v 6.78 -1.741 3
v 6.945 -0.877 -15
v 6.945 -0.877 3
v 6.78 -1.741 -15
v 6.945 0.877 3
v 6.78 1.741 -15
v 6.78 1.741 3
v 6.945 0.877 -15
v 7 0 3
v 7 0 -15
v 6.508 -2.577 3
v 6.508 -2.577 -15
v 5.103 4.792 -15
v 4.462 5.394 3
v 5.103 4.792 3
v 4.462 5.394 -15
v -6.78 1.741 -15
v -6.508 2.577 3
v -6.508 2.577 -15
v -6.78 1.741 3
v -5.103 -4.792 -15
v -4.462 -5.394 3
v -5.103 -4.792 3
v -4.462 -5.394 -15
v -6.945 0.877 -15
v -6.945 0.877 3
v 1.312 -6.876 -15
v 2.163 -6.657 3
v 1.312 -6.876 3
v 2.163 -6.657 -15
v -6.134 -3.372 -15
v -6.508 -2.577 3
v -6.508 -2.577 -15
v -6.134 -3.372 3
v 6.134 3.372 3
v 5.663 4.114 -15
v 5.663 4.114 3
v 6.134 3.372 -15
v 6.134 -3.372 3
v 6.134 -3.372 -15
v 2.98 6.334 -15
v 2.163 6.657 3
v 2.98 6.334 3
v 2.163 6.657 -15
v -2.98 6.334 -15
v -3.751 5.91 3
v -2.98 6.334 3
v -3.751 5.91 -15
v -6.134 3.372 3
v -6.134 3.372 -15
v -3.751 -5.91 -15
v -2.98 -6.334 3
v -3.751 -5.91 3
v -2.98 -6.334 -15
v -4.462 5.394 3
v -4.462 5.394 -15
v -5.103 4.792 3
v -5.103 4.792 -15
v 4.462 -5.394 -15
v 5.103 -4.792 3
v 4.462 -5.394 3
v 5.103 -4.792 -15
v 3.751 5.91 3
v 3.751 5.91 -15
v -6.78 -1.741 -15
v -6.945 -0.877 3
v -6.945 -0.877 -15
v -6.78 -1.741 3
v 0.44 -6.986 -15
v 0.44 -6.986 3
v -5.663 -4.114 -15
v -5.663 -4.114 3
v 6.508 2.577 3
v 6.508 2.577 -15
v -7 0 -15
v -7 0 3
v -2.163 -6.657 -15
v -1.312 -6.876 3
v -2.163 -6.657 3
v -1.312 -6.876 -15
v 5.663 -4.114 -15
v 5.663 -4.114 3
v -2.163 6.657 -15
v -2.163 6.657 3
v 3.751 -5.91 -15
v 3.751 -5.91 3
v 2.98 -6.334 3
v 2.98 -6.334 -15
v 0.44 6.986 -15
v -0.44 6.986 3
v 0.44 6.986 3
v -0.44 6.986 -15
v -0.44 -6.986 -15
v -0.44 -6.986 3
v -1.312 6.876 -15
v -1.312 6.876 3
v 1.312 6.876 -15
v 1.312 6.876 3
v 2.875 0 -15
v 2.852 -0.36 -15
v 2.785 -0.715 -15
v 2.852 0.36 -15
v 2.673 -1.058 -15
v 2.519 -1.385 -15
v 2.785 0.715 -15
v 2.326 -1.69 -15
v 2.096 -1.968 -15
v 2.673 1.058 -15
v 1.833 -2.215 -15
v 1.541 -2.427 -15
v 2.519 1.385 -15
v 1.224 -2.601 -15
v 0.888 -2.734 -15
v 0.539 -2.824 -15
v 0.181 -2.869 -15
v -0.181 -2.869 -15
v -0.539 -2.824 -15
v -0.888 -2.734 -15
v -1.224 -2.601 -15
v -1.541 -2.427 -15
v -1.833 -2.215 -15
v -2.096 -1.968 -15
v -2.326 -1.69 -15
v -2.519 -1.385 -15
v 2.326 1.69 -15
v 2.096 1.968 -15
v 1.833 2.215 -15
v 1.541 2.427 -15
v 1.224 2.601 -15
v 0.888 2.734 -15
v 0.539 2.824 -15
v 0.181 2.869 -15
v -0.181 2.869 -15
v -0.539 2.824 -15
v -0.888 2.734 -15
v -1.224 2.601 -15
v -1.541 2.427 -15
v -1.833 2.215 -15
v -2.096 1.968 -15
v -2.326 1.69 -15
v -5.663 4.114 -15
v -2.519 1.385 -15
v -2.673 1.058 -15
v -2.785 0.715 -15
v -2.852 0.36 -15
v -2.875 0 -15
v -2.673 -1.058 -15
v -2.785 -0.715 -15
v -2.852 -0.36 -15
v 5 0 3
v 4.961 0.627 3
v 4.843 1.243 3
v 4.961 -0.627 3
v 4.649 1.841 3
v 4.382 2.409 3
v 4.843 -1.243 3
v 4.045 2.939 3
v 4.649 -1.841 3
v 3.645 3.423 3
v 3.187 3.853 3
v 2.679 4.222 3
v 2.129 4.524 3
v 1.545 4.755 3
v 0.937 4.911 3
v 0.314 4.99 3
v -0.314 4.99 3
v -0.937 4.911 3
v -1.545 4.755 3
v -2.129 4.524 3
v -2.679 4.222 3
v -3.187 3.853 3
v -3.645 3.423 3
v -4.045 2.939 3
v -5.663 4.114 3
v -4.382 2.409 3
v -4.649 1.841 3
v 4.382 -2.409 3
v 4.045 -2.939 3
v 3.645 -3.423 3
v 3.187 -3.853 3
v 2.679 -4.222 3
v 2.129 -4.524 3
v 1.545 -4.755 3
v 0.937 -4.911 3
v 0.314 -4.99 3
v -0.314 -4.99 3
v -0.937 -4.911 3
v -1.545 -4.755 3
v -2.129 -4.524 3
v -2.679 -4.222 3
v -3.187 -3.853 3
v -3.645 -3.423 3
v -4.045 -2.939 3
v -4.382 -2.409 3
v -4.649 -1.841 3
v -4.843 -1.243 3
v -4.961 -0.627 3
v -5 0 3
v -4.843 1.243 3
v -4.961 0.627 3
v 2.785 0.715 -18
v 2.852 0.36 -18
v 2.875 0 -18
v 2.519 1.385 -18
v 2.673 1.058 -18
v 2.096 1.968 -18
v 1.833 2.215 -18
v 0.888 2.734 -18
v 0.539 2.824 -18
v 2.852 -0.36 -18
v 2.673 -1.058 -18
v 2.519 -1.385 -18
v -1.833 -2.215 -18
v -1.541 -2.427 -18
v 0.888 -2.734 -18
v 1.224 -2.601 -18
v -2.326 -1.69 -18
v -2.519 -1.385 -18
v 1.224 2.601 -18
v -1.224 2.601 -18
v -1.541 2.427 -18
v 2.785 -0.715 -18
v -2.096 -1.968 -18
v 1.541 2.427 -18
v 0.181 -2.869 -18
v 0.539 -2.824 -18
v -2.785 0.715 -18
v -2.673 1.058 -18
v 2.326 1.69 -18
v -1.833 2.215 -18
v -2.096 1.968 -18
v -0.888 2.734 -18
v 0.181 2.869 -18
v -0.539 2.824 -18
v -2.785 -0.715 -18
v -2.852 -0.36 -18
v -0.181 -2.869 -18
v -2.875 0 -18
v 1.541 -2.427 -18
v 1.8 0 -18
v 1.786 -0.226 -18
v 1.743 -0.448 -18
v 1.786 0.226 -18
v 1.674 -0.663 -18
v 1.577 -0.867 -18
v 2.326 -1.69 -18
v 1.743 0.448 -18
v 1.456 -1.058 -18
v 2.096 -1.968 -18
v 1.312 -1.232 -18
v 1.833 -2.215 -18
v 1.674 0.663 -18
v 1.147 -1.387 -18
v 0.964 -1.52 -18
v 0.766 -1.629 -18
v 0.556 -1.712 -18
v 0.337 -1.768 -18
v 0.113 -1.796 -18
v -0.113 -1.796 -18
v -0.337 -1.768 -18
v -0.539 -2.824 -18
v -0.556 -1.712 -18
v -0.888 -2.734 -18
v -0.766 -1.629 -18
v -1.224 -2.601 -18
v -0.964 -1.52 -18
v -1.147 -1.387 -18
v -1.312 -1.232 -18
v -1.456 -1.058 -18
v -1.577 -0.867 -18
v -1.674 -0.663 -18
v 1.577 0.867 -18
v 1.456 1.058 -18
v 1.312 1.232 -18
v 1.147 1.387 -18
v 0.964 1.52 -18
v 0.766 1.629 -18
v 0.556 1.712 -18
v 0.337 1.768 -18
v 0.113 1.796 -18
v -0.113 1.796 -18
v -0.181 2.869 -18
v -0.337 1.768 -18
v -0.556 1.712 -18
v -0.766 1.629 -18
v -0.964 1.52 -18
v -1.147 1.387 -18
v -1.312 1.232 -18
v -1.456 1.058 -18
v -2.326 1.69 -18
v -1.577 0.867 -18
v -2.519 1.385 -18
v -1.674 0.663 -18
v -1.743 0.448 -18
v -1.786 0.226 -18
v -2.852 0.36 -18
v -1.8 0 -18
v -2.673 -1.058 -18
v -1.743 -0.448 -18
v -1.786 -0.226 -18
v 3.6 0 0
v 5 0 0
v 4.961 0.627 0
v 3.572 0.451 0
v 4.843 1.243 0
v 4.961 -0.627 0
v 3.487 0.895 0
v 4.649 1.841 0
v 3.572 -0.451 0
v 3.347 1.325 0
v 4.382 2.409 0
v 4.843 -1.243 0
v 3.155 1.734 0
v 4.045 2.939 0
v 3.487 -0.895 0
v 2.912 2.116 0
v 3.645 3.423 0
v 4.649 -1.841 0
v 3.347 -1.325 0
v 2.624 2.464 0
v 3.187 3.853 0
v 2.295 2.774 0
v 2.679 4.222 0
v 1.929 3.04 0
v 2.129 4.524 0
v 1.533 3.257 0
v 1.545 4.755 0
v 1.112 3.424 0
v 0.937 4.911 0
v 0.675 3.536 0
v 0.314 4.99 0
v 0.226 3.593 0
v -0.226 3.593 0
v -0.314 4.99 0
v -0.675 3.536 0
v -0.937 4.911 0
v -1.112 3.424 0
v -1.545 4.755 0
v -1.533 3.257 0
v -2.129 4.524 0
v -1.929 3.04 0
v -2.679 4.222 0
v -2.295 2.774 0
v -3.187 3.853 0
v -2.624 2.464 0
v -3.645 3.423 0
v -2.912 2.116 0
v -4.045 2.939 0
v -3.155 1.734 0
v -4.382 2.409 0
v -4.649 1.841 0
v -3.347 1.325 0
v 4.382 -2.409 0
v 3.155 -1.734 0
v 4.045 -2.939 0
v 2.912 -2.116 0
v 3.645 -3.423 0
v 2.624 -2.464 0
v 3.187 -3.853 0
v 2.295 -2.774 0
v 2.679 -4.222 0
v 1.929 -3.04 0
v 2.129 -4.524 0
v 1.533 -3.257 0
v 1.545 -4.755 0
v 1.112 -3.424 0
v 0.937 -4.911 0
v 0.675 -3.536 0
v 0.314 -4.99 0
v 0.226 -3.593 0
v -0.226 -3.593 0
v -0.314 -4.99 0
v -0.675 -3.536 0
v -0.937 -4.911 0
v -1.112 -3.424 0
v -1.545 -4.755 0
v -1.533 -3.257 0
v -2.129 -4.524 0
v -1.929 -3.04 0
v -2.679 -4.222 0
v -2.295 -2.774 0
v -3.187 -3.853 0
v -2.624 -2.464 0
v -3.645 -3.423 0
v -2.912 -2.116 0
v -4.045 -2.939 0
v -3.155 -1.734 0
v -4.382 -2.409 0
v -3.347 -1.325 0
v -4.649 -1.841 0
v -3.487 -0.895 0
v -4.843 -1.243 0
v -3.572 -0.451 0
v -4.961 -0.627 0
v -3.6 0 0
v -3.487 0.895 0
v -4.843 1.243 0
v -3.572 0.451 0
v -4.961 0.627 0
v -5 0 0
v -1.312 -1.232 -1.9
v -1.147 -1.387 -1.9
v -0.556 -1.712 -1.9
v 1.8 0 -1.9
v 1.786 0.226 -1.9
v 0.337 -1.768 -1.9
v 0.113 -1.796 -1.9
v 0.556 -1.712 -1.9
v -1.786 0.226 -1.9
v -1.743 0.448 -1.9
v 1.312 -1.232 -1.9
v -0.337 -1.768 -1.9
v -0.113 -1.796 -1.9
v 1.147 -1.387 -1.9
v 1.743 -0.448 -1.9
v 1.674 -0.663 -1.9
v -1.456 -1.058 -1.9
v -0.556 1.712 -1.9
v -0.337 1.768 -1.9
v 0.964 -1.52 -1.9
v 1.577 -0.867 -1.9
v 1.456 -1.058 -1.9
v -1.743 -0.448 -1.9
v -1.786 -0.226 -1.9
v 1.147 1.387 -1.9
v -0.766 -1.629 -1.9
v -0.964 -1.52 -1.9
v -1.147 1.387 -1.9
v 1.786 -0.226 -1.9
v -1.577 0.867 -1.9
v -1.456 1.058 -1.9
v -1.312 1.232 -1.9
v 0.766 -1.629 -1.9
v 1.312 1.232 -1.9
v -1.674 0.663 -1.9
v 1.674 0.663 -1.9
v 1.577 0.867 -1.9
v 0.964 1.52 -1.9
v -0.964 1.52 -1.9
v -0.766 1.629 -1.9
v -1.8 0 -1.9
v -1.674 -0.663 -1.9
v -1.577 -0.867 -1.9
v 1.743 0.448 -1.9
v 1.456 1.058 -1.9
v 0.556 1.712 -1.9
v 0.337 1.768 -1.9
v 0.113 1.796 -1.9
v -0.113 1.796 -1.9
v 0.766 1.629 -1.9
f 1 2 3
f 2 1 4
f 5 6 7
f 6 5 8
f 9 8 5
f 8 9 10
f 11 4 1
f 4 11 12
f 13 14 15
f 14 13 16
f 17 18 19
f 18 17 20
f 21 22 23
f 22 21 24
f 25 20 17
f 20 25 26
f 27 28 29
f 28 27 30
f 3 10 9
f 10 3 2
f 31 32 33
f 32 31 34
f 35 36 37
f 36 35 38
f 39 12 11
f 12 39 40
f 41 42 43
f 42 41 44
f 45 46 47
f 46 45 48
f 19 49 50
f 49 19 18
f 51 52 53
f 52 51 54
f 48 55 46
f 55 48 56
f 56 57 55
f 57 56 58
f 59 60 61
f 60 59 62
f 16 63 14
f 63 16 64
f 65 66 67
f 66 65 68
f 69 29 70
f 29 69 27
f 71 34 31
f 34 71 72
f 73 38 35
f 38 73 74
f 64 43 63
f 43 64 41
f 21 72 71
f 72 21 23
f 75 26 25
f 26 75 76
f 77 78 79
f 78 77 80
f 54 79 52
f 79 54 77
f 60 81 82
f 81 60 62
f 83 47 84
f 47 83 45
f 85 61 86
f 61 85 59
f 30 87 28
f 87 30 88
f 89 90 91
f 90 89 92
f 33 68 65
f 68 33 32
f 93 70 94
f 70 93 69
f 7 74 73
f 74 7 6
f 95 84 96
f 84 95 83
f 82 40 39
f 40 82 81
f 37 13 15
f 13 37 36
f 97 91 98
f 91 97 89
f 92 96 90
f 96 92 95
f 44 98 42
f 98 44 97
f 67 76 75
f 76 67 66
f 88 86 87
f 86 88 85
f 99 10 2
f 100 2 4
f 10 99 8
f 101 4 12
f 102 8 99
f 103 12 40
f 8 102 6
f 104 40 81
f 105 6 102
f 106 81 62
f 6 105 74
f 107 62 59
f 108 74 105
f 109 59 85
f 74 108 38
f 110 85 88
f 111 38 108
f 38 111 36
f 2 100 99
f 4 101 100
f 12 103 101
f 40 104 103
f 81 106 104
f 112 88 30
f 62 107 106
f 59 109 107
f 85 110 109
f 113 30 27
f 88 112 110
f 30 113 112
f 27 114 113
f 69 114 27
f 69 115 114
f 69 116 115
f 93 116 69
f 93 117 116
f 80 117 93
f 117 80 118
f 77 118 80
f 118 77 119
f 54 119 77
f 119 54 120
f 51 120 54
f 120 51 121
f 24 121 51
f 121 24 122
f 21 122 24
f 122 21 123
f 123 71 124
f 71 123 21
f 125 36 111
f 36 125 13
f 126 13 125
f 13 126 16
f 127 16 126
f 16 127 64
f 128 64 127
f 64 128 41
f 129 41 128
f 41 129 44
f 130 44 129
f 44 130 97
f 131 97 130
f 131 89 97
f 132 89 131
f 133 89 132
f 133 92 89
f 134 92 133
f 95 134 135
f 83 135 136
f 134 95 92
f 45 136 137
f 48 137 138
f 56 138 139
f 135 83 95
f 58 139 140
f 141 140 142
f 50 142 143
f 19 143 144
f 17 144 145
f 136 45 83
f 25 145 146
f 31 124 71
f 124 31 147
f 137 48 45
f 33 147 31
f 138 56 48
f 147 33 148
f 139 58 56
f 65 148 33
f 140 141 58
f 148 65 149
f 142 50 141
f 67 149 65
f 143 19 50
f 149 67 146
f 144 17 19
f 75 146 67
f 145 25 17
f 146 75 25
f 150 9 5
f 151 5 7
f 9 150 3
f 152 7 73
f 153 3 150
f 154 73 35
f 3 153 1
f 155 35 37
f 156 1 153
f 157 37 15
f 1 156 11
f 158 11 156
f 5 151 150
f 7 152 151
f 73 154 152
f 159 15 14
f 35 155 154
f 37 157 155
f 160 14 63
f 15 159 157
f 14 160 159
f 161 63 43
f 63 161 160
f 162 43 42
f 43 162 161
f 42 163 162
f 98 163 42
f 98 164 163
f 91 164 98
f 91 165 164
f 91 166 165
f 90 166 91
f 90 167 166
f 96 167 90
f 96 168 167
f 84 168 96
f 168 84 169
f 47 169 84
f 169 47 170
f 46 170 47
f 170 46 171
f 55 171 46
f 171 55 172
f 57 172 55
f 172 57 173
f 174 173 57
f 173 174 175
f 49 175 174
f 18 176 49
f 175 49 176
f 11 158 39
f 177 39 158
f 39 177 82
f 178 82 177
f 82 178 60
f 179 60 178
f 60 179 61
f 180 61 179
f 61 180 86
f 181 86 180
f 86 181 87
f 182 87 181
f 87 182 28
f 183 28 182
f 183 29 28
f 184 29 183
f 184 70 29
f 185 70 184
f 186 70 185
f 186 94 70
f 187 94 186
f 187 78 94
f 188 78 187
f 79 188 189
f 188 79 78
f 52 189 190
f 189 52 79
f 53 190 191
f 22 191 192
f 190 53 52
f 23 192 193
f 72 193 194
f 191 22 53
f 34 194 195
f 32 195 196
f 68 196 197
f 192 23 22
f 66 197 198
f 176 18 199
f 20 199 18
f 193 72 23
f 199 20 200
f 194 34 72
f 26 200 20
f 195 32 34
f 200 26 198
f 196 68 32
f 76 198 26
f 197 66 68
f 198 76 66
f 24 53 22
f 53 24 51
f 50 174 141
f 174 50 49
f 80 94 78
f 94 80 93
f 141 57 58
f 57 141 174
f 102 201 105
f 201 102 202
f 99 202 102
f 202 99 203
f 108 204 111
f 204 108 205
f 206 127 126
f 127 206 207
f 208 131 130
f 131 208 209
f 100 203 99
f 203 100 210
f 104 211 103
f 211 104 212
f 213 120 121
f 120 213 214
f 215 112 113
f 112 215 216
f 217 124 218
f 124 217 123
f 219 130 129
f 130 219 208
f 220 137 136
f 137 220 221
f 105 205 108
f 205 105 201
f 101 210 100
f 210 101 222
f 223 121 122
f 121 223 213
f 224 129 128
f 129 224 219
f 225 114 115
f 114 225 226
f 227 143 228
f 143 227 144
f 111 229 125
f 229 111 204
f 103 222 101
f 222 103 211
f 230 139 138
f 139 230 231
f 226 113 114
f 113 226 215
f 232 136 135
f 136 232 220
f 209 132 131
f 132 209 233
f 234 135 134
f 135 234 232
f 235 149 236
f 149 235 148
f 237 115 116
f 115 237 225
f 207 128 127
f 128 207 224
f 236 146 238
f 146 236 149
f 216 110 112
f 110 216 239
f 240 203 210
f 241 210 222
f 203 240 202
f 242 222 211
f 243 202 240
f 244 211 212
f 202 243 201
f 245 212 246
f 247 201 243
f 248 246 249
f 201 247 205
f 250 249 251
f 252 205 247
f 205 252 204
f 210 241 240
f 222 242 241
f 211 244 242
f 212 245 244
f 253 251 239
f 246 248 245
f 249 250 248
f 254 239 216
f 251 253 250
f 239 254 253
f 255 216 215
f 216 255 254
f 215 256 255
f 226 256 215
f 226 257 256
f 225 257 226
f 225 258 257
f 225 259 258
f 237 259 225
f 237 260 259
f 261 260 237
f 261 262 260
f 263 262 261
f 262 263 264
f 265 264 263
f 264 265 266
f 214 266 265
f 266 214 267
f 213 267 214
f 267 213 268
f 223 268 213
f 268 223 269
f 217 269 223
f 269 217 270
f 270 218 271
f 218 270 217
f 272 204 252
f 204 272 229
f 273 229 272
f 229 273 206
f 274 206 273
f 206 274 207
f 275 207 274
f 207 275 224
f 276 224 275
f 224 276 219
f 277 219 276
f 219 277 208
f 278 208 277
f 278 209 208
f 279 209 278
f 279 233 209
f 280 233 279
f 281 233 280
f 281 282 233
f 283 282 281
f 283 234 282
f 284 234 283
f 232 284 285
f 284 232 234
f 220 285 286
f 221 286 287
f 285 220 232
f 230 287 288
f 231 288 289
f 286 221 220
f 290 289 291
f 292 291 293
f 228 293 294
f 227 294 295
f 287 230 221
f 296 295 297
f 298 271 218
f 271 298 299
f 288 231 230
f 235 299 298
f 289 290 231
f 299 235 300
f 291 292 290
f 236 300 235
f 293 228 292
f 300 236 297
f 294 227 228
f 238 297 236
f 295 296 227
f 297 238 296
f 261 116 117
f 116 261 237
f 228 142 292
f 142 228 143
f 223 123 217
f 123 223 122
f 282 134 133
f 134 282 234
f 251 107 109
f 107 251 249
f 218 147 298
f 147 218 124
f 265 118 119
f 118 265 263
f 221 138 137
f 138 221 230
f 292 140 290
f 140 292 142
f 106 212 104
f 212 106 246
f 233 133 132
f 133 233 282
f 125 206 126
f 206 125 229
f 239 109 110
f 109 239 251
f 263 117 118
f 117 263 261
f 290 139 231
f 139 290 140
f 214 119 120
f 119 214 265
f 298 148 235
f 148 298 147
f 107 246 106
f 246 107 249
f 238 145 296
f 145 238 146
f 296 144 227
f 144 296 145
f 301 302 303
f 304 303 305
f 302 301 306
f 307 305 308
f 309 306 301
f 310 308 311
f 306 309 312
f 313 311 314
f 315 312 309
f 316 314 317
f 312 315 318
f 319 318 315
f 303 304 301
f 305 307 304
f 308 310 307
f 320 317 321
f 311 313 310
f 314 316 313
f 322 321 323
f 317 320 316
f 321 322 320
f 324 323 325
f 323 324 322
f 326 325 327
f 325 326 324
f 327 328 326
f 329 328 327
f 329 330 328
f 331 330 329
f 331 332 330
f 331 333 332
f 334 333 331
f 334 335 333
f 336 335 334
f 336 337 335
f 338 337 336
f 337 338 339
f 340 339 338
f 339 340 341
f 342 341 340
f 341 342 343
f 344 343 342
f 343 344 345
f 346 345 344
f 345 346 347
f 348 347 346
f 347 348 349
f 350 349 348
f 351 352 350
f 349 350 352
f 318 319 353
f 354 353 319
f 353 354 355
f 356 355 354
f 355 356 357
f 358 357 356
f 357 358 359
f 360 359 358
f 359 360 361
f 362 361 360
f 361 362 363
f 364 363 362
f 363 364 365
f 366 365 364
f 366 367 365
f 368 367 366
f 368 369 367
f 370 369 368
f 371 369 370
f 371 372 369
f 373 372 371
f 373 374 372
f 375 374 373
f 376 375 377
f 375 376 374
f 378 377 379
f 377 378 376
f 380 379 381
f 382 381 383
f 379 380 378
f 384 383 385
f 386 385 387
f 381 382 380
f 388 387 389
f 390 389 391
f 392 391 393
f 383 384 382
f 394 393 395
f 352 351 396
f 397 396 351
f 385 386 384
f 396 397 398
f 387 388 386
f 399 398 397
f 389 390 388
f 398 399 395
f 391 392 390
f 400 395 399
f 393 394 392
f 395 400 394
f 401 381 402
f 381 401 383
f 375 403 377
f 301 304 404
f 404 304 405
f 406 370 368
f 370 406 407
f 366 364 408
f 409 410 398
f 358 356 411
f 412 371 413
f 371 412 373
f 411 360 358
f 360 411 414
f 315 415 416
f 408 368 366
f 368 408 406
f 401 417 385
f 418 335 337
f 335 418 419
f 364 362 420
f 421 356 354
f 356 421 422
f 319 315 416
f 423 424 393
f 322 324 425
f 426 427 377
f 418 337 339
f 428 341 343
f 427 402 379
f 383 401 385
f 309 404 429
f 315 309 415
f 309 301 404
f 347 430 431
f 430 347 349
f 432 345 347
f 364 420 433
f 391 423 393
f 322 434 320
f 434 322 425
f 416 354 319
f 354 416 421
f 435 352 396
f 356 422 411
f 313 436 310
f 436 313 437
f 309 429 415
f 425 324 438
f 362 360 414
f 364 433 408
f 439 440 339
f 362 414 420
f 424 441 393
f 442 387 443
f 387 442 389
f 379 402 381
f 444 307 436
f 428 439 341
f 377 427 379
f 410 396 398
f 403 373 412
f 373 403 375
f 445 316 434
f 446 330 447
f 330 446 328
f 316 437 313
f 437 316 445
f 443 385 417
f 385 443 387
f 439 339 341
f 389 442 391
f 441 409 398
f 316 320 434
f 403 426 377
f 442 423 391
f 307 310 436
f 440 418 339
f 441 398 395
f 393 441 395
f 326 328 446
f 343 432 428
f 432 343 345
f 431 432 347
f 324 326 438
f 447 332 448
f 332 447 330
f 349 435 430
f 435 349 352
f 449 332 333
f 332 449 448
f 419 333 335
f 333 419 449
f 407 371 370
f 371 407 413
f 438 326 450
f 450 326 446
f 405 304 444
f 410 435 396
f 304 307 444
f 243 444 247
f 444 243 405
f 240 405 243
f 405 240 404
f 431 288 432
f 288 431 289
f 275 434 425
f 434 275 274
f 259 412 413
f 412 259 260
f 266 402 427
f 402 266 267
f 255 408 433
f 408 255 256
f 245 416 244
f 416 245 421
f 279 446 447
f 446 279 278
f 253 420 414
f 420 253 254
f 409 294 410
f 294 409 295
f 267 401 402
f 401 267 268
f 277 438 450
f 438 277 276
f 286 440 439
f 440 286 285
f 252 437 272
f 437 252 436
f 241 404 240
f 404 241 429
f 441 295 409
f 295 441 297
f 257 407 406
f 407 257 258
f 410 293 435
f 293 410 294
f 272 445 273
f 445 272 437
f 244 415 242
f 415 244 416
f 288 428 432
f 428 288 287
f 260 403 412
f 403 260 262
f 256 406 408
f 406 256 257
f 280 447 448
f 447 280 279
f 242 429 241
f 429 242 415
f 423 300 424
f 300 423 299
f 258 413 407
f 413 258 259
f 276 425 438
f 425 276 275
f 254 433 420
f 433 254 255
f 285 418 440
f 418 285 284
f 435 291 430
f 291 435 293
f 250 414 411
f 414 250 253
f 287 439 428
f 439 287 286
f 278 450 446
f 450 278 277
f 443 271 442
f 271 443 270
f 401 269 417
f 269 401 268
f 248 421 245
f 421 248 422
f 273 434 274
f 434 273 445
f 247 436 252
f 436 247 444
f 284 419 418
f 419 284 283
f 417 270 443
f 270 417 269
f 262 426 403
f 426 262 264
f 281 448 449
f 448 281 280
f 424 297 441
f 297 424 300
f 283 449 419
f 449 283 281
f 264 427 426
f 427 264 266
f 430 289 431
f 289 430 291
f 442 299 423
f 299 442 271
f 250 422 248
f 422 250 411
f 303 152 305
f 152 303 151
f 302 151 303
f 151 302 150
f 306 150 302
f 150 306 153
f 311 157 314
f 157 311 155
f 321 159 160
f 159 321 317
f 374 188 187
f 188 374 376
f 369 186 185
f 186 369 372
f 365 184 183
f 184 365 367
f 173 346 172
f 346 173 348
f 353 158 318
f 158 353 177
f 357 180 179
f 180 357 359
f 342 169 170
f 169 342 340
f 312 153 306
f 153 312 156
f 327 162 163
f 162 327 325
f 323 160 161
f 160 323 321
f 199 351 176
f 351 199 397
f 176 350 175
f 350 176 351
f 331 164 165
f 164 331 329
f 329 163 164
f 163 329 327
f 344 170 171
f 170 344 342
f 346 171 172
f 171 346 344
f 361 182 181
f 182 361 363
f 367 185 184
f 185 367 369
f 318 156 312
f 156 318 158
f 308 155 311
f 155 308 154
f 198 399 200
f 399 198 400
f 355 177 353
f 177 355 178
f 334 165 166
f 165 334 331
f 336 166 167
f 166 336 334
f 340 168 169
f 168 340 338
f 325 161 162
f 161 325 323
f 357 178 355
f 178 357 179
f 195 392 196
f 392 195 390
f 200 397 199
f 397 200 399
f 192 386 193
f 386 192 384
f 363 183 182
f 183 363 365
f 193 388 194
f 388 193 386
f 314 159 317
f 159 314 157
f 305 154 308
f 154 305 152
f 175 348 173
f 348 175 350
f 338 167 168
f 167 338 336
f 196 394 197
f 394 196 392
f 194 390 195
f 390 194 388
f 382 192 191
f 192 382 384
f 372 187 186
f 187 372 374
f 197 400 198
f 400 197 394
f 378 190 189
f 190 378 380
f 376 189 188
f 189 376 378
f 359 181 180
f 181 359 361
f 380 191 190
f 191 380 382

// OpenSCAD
$fn = 50;

difference() {
	union() {
		translate(v = [0, 0, -15.0]) {
			cylinder(h = 18, r = 7.0);
		}
		#translate(v = [0, 0, -18.0]) {
			cylinder(h = 18, r = 2.875);
		}
	}
	union() {
		translate(v = [0, 0, 0]) {
			rotate(a = [0, 0, 0]) {
				difference() {
					union() {
						translate(v = [0, 0, -18.0]) {
							cylinder(h = 18, r = 1.5);
						}
						translate(v = [0, 0, -1.9]) {
							cylinder(h = 1.9, r1 = 1.8, r2 = 3.6);
						}
						translate(v = [0, 0, -18.0]) {
							cylinder(h = 18, r = 1.8);
						}
						translate(v = [0, 0, -18.0]) {
							cylinder(h = 18, r = 1.5);
						}
					}
					union();
				}
			}
		}
		#cylinder(h = 3, r = 5.0);
	}
}
